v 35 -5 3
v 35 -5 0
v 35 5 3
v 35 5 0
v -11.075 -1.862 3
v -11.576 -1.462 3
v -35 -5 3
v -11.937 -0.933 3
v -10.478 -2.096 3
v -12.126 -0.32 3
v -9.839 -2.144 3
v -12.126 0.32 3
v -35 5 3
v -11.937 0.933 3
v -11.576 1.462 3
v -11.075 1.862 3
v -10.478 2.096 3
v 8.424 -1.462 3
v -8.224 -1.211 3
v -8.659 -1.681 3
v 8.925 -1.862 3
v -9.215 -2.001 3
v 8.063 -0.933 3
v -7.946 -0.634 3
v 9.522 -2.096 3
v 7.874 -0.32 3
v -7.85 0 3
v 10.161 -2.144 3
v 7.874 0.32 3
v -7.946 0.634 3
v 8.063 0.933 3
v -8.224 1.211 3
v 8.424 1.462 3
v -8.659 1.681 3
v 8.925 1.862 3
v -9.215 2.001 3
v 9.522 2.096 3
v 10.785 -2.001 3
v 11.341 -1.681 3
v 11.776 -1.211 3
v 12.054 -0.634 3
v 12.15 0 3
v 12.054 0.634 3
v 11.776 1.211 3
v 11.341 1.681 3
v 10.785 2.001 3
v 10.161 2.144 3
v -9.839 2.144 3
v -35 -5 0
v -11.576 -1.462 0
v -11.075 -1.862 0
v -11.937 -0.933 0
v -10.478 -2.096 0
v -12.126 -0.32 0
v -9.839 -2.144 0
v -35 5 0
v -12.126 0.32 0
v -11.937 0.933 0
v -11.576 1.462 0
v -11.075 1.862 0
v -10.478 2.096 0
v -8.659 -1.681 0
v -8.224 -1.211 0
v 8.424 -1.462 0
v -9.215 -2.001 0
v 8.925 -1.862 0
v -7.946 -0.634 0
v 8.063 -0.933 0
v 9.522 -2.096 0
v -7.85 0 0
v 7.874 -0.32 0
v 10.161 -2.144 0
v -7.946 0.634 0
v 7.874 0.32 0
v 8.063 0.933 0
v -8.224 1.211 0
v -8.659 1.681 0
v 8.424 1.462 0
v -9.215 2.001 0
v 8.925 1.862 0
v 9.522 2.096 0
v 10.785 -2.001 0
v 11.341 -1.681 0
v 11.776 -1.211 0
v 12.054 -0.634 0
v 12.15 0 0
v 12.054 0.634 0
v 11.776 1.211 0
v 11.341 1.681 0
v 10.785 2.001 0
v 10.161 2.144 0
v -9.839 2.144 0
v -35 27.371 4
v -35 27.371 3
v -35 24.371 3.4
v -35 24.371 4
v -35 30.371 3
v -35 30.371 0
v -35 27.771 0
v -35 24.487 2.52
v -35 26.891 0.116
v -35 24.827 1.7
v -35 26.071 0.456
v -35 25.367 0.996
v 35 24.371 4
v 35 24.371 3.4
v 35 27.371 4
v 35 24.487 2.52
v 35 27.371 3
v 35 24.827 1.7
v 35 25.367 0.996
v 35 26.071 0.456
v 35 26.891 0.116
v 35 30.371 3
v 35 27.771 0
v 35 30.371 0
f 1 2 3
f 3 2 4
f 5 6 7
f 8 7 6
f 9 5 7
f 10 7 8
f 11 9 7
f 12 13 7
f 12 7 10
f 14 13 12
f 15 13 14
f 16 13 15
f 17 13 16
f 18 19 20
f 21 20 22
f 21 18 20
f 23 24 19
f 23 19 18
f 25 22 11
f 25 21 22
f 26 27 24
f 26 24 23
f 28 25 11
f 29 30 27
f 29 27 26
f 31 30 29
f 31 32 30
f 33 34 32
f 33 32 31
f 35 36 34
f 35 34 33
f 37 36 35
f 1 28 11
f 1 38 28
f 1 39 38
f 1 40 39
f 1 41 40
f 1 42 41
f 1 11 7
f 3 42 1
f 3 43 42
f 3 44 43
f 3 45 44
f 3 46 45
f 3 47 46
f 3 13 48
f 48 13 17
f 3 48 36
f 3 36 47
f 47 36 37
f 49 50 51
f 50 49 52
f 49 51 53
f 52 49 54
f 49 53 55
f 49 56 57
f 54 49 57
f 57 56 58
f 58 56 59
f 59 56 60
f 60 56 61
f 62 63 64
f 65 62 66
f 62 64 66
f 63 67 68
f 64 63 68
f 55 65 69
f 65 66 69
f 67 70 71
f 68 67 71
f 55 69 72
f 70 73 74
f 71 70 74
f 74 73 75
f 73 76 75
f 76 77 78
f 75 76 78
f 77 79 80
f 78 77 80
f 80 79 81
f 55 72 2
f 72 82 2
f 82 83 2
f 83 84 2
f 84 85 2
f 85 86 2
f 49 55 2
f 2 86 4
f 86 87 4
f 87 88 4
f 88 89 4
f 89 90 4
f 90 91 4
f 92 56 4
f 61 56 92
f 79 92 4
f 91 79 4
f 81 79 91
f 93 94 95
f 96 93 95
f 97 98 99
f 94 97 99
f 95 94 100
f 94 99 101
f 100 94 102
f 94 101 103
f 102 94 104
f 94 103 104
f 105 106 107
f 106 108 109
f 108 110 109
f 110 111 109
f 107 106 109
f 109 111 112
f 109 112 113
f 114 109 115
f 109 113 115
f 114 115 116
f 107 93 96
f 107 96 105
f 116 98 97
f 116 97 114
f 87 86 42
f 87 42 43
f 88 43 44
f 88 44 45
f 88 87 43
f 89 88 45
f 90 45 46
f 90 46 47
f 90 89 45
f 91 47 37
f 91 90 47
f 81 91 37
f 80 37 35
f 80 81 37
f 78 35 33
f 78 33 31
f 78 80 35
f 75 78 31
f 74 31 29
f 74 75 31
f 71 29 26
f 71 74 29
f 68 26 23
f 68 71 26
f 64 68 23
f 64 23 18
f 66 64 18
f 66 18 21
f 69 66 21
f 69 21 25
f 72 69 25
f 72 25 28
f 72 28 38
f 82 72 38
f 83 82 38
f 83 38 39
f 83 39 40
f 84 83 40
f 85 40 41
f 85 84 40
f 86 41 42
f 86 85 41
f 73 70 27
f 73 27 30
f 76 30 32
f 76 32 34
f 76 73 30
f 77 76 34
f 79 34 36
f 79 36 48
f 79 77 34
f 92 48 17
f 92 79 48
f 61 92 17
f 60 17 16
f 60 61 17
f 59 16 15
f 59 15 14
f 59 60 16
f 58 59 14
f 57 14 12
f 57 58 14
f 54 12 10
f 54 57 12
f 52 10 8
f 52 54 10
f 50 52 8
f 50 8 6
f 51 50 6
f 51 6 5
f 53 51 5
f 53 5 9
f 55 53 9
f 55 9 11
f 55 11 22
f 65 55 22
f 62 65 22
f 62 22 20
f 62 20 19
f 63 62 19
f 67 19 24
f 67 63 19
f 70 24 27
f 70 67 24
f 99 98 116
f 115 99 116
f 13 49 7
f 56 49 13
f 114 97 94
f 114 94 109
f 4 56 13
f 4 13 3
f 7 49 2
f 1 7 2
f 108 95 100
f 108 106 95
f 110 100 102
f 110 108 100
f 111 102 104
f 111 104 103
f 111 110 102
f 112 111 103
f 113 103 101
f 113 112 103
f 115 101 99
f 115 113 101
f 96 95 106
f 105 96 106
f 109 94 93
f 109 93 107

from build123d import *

# Parameters (mm, degrees)
F0_W     = 70
F0_H     = 10
F0_R     = 2.15
F1_DEPTH = 3
F0_H_2   = 3
F2_DEPTH = 3
F3_DEPTH = 4
F4_R     = 3.4


with BuildPart() as f1:
    # F0 (on Top) → F1 (new body)
    with BuildSketch(Plane.XY):
        Rectangle(F0_W, F0_H)
        with Locations((-10, 0)):
            Circle(F0_R, mode=Mode.SUBTRACT)
        with Locations((10, 0)):
            Circle(F0_R, mode=Mode.SUBTRACT)
    extrude(amount=F1_DEPTH)


with BuildPart() as f2:
    # F0 (on Top) → F2 (new body)
    with BuildSketch(Plane.XY):
        with Locations((0, 25.87104)):
            Rectangle(F0_W, F0_H_2)
        with Locations((0, 28.87104)):
            Rectangle(F0_W, F0_H_2)
    extrude(amount=F2_DEPTH)

    # F0 (on Top) → F3 (join)
    with BuildSketch(Plane.XY):
        with Locations((0, 25.87104)):
            Rectangle(F0_W, F0_H_2)
    extrude(amount=F3_DEPTH)

    # F4
    f4_edges = [f2.edges().sort_by_distance(p)[0] for p in [
        (0, 24.37104, 0),
    ]]
    fillet(f4_edges, radius=F4_R)


solid = Compound([f1.part, f2.part])
